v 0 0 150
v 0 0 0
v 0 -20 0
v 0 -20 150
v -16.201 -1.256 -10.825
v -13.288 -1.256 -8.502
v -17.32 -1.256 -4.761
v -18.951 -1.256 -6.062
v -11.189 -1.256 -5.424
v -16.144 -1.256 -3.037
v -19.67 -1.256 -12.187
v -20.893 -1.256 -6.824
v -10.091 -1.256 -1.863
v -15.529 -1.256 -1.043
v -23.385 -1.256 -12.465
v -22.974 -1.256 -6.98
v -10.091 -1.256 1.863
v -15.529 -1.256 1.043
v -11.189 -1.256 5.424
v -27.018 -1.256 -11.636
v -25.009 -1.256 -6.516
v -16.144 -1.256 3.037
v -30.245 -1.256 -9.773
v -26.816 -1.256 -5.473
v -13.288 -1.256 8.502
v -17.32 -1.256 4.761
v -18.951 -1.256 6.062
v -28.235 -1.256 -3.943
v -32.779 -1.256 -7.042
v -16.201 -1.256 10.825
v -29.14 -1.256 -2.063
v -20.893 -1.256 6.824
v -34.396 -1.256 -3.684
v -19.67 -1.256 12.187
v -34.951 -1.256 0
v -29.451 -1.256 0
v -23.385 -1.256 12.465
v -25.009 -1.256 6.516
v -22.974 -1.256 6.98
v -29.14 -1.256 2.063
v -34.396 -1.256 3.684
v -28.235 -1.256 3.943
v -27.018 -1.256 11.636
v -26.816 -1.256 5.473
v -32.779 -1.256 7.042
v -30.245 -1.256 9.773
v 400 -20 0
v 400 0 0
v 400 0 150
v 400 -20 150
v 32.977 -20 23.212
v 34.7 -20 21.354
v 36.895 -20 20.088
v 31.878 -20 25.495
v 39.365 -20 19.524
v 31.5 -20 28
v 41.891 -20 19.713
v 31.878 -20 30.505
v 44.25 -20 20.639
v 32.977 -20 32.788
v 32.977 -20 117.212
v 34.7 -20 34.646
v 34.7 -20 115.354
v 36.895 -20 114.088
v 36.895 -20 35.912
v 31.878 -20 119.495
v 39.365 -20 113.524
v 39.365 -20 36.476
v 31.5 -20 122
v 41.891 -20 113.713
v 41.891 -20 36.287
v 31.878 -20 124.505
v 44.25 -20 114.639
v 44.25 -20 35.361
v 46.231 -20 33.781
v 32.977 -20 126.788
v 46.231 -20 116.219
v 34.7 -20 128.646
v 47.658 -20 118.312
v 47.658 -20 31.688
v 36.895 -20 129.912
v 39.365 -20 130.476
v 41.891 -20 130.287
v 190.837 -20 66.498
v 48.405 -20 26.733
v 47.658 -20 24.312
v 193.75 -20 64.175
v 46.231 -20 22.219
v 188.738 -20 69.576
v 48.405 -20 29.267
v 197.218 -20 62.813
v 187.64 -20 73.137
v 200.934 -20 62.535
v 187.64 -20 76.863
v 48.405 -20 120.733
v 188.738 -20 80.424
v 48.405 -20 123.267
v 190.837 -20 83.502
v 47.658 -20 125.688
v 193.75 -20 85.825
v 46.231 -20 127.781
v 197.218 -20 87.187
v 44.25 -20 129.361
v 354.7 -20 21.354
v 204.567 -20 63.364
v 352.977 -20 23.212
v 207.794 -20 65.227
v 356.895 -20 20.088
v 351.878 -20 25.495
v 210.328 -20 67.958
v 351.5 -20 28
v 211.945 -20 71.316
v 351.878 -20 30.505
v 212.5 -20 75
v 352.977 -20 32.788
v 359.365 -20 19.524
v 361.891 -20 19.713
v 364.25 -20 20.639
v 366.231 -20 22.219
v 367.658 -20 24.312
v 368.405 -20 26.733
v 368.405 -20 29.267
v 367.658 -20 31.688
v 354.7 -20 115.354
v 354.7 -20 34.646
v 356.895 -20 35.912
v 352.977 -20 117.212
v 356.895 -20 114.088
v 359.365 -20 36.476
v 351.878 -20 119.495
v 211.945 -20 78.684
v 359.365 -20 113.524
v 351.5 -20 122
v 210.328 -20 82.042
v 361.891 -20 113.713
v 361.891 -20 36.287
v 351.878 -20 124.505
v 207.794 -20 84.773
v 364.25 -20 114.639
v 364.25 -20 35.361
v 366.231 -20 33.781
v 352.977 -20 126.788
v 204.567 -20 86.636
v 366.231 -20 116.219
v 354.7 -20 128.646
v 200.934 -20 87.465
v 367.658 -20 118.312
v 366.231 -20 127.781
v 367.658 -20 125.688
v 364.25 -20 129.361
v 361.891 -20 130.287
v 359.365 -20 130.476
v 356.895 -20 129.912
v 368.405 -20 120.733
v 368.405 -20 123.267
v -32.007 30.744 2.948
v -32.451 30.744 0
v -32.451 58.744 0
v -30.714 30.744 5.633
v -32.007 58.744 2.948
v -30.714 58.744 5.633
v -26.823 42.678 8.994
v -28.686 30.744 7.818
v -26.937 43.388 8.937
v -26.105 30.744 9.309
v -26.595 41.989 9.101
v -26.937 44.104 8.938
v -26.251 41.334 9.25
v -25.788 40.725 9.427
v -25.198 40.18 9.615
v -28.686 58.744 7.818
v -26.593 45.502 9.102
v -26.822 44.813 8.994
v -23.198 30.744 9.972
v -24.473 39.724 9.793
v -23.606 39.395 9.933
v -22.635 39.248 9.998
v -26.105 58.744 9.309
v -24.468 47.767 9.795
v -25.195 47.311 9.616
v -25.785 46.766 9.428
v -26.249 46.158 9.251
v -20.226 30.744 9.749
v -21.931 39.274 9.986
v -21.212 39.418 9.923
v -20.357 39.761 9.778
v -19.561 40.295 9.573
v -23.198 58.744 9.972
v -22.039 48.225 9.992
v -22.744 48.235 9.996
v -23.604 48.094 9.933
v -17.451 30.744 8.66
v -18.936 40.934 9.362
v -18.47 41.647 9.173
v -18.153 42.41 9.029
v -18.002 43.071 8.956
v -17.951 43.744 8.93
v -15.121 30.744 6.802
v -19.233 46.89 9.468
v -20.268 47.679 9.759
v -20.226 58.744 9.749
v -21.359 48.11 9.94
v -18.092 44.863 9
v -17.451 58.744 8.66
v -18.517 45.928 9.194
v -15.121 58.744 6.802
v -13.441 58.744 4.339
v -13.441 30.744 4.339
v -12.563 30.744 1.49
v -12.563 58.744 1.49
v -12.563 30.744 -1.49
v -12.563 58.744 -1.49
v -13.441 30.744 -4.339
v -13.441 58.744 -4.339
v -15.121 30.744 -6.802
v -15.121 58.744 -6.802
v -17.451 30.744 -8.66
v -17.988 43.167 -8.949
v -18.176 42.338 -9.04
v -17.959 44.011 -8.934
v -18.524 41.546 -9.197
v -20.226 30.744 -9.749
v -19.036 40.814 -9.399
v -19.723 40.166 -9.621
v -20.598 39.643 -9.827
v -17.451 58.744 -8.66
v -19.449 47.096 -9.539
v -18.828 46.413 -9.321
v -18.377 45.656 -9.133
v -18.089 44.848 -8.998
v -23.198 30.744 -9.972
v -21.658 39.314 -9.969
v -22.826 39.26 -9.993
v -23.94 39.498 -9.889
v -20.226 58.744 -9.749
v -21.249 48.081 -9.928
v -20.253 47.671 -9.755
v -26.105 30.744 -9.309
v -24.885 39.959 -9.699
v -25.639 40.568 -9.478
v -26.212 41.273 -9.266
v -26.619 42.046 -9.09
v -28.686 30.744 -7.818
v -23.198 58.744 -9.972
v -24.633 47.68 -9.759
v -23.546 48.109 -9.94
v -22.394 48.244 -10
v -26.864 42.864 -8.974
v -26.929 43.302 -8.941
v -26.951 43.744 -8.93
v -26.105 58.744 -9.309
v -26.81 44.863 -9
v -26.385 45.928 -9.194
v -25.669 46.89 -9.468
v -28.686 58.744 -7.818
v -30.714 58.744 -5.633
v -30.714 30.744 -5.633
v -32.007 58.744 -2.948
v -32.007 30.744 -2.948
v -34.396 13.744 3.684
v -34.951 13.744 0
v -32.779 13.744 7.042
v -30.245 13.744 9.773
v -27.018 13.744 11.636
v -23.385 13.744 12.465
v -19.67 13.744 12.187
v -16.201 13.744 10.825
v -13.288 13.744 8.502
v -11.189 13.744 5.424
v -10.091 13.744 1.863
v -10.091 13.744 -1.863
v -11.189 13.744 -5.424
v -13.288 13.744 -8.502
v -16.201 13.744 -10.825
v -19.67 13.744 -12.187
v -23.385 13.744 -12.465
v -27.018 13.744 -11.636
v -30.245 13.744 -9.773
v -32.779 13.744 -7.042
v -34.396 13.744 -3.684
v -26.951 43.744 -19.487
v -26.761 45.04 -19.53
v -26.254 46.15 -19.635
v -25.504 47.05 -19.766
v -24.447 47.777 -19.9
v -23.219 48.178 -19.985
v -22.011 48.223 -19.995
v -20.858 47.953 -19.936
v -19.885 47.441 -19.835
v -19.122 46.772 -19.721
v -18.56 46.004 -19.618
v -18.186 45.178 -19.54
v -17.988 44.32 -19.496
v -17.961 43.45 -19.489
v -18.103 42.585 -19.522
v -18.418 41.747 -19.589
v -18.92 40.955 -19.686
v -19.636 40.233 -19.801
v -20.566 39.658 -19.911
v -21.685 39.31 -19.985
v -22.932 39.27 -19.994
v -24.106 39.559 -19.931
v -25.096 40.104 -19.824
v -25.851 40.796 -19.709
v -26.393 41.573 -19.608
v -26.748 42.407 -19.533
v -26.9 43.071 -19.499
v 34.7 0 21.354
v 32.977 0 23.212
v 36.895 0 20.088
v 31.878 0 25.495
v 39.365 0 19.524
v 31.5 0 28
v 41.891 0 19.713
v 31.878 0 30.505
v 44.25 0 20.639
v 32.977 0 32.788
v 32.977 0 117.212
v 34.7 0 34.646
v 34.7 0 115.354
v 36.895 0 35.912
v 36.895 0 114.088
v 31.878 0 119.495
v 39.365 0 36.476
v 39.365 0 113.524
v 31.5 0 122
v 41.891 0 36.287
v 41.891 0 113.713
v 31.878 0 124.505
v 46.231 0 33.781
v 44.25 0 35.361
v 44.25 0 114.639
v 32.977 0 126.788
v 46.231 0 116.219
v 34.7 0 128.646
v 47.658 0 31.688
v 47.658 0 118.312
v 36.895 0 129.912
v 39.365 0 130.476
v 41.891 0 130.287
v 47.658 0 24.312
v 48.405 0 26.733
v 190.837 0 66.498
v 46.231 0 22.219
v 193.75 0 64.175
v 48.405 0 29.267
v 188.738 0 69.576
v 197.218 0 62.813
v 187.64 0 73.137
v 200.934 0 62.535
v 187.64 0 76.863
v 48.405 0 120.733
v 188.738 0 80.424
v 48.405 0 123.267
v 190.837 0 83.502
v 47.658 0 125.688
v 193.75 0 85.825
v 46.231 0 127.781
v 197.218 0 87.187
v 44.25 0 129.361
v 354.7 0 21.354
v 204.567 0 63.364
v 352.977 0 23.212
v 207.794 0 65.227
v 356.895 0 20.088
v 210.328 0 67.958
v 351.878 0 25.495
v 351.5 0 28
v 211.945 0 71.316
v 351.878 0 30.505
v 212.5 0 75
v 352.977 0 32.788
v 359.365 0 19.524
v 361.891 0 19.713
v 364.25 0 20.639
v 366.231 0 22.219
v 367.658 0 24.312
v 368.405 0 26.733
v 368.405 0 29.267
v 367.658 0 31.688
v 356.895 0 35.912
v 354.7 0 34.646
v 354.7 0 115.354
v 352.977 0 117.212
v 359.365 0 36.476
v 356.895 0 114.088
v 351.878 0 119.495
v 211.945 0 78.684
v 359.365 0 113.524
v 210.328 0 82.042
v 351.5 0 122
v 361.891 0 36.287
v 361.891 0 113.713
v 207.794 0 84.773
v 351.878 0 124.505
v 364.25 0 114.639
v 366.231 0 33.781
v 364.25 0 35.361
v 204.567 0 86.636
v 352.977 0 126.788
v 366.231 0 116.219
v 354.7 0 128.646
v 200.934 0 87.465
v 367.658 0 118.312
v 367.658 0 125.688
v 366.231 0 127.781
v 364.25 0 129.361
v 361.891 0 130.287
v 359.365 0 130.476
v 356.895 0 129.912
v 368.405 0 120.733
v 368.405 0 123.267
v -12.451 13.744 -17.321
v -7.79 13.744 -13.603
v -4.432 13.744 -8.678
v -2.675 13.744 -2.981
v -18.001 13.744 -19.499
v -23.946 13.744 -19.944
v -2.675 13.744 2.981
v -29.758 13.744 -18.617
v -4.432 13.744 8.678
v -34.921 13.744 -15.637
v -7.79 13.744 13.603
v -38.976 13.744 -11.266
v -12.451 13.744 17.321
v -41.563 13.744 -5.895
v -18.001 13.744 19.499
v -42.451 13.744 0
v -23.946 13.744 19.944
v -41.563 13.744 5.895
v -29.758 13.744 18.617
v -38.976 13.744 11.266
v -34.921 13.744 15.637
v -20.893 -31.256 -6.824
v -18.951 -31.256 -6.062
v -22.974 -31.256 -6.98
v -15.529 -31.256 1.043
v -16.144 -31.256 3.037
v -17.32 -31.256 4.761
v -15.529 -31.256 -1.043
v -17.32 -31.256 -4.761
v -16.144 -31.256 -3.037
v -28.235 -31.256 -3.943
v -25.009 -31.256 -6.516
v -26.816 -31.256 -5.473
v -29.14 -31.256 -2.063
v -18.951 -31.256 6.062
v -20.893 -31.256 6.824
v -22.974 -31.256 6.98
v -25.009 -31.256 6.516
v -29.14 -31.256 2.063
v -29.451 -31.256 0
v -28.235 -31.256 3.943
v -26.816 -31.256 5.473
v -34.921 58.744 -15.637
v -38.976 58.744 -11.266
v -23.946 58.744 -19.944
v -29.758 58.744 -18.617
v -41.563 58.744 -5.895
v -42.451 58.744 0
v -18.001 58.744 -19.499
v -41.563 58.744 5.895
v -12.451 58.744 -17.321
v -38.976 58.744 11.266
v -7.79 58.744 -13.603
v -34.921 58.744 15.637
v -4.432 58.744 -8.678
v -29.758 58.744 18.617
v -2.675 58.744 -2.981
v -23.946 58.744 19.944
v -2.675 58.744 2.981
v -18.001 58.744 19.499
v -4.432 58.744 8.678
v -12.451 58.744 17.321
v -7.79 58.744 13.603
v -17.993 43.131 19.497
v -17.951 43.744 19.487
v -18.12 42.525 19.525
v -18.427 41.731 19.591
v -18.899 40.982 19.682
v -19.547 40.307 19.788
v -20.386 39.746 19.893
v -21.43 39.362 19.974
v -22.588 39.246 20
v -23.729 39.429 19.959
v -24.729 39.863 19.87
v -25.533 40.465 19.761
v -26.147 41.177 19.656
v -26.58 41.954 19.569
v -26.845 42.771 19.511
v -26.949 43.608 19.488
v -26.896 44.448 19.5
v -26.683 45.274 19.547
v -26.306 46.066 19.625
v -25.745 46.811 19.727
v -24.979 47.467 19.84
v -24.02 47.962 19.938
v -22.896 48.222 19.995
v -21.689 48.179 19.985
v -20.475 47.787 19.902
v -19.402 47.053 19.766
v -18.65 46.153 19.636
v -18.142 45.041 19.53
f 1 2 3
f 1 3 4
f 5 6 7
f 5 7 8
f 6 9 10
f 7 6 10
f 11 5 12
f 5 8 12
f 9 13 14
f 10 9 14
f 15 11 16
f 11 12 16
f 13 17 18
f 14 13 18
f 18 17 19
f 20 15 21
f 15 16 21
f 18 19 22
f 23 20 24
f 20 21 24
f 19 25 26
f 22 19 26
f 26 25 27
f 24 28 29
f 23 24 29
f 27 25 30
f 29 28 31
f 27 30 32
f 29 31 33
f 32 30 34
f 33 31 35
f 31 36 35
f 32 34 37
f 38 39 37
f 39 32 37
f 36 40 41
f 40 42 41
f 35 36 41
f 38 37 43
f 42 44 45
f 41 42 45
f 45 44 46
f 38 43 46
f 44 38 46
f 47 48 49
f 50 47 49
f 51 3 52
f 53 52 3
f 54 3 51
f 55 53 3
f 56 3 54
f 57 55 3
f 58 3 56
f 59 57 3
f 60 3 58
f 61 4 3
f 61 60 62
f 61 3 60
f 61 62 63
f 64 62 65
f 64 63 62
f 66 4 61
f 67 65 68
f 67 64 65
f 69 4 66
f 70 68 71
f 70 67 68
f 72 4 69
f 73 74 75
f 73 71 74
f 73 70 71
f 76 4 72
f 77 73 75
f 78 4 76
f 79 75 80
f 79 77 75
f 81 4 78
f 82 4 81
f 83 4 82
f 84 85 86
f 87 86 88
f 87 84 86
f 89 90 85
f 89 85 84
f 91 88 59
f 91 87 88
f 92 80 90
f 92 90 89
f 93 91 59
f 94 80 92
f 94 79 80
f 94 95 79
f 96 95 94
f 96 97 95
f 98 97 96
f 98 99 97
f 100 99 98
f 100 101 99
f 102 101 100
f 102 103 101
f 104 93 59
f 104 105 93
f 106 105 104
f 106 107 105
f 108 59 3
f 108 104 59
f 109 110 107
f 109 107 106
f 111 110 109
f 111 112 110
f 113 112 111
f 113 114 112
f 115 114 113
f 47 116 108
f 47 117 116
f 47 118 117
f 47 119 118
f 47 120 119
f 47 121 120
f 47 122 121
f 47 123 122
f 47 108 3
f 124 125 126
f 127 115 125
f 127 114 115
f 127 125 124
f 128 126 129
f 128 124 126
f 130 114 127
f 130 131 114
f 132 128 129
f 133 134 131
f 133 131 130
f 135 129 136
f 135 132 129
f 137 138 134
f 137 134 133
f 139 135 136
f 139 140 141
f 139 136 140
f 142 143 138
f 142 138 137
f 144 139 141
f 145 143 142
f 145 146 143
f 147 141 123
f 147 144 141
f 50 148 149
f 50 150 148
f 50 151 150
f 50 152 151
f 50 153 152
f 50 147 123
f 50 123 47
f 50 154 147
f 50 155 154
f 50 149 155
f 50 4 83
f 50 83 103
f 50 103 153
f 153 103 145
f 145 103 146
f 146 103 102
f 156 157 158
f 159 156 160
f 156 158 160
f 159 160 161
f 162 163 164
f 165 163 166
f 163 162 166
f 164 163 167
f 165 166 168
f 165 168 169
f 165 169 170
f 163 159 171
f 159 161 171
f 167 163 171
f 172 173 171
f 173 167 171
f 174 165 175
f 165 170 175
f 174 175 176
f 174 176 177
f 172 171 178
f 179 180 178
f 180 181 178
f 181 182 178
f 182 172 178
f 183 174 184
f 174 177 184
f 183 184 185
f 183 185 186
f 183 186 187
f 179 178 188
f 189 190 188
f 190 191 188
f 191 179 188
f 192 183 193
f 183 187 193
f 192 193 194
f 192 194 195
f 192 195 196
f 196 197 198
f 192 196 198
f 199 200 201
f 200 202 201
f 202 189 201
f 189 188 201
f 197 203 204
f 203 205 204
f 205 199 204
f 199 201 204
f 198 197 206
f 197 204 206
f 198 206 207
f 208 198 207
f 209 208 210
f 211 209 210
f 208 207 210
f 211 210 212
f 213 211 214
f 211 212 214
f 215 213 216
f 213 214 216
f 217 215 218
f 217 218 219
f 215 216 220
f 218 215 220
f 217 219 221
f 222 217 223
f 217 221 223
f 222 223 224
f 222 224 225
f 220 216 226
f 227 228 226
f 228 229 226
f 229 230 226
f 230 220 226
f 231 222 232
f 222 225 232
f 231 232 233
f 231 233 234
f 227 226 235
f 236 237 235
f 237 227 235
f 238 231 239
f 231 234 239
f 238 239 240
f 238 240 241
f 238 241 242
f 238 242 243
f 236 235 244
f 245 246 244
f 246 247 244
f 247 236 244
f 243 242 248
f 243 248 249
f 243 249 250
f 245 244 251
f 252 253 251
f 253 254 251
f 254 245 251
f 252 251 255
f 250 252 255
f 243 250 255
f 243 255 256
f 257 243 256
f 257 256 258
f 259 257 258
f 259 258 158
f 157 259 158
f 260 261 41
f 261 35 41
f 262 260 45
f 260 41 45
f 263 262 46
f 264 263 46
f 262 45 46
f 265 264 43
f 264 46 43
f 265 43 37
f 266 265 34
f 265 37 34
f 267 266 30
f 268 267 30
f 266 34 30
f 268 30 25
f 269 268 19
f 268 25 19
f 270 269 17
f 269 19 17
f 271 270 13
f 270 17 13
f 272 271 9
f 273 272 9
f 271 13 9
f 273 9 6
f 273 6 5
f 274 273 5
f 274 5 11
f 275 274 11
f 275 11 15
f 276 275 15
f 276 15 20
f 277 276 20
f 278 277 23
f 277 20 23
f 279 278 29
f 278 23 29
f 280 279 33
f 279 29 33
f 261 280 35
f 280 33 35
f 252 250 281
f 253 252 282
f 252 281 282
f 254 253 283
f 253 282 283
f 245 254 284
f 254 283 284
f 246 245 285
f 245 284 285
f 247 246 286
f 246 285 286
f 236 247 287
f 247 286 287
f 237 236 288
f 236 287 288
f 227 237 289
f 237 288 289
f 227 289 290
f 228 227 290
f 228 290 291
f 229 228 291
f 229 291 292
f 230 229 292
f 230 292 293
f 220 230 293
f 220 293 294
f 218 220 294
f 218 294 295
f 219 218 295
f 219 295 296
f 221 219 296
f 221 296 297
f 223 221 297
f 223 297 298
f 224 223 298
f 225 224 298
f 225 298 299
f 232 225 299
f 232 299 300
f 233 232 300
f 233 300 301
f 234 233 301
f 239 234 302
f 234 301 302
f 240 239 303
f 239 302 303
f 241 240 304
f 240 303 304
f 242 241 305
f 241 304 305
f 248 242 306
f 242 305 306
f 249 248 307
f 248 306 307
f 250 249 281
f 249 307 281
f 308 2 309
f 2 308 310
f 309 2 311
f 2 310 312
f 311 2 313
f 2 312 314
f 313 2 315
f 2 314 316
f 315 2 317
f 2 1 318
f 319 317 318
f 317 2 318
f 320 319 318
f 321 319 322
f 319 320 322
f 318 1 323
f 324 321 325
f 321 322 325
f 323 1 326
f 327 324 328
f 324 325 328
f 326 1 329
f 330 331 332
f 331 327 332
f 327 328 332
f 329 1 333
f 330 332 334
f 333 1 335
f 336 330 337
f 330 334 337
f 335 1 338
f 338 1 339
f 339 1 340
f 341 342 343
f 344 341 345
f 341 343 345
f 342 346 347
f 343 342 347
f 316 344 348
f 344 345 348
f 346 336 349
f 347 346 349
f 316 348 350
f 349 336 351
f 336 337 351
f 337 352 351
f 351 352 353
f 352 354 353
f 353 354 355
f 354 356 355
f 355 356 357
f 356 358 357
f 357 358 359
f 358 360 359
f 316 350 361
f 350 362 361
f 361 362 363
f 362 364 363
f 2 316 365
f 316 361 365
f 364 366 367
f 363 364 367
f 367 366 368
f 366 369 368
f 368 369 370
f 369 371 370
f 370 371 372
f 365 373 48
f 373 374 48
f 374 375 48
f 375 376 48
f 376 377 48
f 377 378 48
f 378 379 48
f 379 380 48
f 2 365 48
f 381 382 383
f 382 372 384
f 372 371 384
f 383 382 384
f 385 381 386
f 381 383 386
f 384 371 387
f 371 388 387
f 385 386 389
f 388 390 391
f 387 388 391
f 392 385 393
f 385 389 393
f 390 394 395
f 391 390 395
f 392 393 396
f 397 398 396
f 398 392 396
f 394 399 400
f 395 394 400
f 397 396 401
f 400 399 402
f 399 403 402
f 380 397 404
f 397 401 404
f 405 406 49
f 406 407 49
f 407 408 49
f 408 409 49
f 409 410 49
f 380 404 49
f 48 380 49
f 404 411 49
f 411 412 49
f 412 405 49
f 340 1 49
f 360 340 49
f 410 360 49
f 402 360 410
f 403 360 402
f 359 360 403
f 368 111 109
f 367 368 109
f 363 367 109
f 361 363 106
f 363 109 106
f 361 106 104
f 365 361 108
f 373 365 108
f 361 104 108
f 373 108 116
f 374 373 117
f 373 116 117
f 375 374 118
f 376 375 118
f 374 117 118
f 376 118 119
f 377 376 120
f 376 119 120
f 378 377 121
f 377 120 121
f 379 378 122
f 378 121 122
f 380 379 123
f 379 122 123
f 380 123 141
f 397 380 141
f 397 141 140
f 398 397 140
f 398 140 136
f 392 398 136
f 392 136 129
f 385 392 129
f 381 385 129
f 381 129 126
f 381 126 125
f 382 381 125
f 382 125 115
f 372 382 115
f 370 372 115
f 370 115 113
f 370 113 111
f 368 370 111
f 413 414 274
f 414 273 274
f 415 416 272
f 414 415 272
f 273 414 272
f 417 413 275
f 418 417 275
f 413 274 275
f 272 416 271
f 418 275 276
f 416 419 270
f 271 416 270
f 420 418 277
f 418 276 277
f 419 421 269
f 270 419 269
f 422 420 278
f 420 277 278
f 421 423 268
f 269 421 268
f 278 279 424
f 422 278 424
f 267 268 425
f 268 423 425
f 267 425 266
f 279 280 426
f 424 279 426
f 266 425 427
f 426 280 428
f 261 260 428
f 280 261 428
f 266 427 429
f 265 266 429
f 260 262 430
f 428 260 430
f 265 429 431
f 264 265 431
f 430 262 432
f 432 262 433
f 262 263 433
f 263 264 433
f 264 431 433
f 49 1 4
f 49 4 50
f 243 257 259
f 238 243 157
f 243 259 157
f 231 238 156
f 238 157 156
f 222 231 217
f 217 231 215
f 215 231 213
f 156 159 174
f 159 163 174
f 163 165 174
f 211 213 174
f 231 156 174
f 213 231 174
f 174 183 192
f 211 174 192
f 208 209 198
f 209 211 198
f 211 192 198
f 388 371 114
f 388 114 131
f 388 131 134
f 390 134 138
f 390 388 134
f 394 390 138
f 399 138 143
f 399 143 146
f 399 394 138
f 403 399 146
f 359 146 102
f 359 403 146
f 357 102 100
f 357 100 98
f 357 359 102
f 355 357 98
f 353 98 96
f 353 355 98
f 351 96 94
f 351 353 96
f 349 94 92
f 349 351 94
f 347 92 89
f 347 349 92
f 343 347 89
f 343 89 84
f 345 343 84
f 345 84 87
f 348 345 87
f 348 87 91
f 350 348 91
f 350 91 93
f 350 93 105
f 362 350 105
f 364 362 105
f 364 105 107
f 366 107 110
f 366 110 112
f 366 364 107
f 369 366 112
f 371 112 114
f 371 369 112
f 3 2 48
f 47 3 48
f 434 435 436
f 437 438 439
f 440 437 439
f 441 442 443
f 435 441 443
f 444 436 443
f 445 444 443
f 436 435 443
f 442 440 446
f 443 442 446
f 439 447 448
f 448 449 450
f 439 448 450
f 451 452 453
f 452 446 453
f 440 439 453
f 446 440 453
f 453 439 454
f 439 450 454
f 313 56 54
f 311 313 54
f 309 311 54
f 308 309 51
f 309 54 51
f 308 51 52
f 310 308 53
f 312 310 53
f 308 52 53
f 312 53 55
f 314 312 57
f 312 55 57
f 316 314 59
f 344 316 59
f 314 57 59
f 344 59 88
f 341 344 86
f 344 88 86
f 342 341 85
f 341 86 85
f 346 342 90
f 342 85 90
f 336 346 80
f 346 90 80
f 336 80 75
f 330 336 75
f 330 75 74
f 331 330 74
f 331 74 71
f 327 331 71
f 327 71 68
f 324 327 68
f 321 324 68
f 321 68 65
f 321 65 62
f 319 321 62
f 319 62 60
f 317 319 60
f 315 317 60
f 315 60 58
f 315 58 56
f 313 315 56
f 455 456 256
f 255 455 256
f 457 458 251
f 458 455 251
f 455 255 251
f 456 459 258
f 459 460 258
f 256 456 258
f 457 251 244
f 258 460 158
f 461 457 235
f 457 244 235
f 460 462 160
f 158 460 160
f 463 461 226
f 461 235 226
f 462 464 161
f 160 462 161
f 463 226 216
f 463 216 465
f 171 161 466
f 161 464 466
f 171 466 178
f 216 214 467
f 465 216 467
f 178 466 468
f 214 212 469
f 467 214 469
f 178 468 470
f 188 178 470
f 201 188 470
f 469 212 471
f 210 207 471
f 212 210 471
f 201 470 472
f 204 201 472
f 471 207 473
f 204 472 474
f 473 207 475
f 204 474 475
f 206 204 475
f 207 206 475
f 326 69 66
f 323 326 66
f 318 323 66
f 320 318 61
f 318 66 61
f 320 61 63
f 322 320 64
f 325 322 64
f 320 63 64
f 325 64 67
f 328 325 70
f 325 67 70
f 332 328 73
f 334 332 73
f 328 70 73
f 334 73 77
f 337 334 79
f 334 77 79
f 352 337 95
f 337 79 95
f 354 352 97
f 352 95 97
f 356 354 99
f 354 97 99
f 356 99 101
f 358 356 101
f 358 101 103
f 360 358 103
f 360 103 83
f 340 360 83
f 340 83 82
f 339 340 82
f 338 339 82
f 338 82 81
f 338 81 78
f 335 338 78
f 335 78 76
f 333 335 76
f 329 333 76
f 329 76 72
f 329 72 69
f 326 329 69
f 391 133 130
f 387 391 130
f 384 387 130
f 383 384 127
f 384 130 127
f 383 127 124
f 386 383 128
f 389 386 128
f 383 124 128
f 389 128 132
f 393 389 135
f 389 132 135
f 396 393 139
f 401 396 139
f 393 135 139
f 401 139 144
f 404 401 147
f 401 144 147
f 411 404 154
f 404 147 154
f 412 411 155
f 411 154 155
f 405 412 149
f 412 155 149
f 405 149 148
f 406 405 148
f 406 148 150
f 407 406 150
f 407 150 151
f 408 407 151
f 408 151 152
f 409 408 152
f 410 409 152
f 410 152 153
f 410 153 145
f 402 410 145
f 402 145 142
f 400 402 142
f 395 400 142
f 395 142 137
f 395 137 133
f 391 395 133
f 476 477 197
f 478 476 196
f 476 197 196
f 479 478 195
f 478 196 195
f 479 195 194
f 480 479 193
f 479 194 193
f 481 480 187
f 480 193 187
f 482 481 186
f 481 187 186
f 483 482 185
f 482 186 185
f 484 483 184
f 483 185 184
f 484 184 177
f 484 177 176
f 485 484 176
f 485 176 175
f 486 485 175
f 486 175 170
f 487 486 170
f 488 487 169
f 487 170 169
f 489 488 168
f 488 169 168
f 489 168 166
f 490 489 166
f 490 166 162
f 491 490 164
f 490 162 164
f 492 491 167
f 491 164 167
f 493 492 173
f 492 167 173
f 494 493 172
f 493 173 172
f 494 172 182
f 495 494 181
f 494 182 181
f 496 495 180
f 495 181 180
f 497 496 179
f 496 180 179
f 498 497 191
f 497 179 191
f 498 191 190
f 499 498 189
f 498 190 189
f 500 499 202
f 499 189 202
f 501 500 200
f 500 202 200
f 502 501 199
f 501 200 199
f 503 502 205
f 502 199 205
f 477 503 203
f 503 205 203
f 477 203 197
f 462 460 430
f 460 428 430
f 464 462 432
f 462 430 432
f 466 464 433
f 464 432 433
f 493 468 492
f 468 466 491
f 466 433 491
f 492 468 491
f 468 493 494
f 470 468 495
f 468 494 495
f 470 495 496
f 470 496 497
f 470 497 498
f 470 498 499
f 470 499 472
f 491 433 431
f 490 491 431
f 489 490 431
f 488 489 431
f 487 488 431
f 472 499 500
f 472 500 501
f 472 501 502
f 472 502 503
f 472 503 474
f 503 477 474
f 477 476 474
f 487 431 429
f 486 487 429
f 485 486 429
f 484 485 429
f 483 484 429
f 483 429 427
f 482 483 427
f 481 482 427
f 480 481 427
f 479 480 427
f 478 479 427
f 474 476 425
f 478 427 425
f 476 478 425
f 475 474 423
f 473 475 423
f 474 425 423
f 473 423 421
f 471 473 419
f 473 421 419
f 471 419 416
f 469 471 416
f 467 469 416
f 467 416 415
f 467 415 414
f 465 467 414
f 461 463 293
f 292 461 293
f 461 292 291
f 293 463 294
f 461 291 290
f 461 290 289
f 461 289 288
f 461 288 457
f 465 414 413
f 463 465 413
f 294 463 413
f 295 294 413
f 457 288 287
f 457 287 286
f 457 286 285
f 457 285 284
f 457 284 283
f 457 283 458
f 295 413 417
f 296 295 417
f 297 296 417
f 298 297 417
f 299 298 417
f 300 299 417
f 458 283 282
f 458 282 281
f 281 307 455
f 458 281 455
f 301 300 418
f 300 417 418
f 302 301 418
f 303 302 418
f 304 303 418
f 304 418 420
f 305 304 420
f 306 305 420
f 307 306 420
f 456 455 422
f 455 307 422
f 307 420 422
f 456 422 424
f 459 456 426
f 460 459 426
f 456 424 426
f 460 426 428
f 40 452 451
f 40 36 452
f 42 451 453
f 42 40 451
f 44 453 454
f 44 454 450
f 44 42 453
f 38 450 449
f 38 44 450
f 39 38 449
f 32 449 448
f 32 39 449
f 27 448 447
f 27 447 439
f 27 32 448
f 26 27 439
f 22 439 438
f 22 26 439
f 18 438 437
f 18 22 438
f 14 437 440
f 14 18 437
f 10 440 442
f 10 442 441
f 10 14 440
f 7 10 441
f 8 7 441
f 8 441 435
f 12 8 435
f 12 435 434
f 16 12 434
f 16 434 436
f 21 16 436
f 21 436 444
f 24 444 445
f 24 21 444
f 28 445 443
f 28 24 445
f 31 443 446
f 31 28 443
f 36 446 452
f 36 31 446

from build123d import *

# Parameters (mm, degrees)
F0_W     = 400
F0_H     = 150
F0_R     = 12.5
F1_DEPTH = 20
F2_W     = 7
F2_H     = 30
F4_D     = 9
F4_DEPTH = 20.001
F5_D     = 9
F6_D     = 17
F6_DEPTH = 35
F6_TIP   = 5.1073152617


with BuildPart() as f1:
    # F0 (on Front) → F1 (new body)
    with BuildSketch(Plane.XZ):
        with Locations((200, 75)):
            Rectangle(F0_W, F0_H)
        with Locations((200, 75)):
            Circle(F0_R, mode=Mode.SUBTRACT)
    extrude(amount=F1_DEPTH)

    # F6
    with Locations(Plane(origin=(0, 0, 0), x_dir=(1, 0, 0), z_dir=(0, 1, 0))):
        with Locations((360, -122), (360, -28), (40, -122), (40, -28)):
            Hole(F6_D / 2, depth=F6_DEPTH)
            with Locations((0, 0, -(F6_DEPTH + F6_TIP / 2))):  # 118° drill point
                Cone(0, F6_D / 2, F6_TIP, mode=Mode.SUBTRACT)


with BuildPart() as f3:
    # F2 (on Top) → F3 (revolve)
    with BuildSketch(Plane.XY):
        Polygon((-22.451127246, -1.2559221685), (-22.451127246, 13.7440778315), (-34.951127246, 13.7440778315), (-34.951127246, -1.2559221685), (-29.451127246, -1.2559221685), align=None)
        Polygon((-34.951127246, 13.7440778315), (-22.451127246, 13.7440778315), (-22.451127246, 30.7440778315), (-32.451127246, 30.7440778315), (-32.451127246, 58.7440778315), (-42.451127246, 58.7440778315), (-42.451127246, 13.7440778315), align=None)
        with Locations((-25.951127246, -16.2559221685)):
            Rectangle(F2_W, F2_H)
    revolve(axis=Axis((-22.451127246, 22.2440778315, 0), (0, 1, 0)))

    # F4 (through all, one way)
    with BuildSketch(Plane(origin=(0, 0, 0), x_dir=(1, 0, 0), z_dir=(0, 0, -1))):
        with Locations((-22.451127246, -43.7440778315)):
            Circle(F4_D / 2)
    extrude(amount=-F4_DEPTH, mode=Mode.SUBTRACT)

    # F5 (through all)
    with Locations(Plane.XY):
        with Locations((-22.451127246, 43.7440778315)):
            Hole(F5_D / 2)


solid = Compound([f1.part, f3.part])
